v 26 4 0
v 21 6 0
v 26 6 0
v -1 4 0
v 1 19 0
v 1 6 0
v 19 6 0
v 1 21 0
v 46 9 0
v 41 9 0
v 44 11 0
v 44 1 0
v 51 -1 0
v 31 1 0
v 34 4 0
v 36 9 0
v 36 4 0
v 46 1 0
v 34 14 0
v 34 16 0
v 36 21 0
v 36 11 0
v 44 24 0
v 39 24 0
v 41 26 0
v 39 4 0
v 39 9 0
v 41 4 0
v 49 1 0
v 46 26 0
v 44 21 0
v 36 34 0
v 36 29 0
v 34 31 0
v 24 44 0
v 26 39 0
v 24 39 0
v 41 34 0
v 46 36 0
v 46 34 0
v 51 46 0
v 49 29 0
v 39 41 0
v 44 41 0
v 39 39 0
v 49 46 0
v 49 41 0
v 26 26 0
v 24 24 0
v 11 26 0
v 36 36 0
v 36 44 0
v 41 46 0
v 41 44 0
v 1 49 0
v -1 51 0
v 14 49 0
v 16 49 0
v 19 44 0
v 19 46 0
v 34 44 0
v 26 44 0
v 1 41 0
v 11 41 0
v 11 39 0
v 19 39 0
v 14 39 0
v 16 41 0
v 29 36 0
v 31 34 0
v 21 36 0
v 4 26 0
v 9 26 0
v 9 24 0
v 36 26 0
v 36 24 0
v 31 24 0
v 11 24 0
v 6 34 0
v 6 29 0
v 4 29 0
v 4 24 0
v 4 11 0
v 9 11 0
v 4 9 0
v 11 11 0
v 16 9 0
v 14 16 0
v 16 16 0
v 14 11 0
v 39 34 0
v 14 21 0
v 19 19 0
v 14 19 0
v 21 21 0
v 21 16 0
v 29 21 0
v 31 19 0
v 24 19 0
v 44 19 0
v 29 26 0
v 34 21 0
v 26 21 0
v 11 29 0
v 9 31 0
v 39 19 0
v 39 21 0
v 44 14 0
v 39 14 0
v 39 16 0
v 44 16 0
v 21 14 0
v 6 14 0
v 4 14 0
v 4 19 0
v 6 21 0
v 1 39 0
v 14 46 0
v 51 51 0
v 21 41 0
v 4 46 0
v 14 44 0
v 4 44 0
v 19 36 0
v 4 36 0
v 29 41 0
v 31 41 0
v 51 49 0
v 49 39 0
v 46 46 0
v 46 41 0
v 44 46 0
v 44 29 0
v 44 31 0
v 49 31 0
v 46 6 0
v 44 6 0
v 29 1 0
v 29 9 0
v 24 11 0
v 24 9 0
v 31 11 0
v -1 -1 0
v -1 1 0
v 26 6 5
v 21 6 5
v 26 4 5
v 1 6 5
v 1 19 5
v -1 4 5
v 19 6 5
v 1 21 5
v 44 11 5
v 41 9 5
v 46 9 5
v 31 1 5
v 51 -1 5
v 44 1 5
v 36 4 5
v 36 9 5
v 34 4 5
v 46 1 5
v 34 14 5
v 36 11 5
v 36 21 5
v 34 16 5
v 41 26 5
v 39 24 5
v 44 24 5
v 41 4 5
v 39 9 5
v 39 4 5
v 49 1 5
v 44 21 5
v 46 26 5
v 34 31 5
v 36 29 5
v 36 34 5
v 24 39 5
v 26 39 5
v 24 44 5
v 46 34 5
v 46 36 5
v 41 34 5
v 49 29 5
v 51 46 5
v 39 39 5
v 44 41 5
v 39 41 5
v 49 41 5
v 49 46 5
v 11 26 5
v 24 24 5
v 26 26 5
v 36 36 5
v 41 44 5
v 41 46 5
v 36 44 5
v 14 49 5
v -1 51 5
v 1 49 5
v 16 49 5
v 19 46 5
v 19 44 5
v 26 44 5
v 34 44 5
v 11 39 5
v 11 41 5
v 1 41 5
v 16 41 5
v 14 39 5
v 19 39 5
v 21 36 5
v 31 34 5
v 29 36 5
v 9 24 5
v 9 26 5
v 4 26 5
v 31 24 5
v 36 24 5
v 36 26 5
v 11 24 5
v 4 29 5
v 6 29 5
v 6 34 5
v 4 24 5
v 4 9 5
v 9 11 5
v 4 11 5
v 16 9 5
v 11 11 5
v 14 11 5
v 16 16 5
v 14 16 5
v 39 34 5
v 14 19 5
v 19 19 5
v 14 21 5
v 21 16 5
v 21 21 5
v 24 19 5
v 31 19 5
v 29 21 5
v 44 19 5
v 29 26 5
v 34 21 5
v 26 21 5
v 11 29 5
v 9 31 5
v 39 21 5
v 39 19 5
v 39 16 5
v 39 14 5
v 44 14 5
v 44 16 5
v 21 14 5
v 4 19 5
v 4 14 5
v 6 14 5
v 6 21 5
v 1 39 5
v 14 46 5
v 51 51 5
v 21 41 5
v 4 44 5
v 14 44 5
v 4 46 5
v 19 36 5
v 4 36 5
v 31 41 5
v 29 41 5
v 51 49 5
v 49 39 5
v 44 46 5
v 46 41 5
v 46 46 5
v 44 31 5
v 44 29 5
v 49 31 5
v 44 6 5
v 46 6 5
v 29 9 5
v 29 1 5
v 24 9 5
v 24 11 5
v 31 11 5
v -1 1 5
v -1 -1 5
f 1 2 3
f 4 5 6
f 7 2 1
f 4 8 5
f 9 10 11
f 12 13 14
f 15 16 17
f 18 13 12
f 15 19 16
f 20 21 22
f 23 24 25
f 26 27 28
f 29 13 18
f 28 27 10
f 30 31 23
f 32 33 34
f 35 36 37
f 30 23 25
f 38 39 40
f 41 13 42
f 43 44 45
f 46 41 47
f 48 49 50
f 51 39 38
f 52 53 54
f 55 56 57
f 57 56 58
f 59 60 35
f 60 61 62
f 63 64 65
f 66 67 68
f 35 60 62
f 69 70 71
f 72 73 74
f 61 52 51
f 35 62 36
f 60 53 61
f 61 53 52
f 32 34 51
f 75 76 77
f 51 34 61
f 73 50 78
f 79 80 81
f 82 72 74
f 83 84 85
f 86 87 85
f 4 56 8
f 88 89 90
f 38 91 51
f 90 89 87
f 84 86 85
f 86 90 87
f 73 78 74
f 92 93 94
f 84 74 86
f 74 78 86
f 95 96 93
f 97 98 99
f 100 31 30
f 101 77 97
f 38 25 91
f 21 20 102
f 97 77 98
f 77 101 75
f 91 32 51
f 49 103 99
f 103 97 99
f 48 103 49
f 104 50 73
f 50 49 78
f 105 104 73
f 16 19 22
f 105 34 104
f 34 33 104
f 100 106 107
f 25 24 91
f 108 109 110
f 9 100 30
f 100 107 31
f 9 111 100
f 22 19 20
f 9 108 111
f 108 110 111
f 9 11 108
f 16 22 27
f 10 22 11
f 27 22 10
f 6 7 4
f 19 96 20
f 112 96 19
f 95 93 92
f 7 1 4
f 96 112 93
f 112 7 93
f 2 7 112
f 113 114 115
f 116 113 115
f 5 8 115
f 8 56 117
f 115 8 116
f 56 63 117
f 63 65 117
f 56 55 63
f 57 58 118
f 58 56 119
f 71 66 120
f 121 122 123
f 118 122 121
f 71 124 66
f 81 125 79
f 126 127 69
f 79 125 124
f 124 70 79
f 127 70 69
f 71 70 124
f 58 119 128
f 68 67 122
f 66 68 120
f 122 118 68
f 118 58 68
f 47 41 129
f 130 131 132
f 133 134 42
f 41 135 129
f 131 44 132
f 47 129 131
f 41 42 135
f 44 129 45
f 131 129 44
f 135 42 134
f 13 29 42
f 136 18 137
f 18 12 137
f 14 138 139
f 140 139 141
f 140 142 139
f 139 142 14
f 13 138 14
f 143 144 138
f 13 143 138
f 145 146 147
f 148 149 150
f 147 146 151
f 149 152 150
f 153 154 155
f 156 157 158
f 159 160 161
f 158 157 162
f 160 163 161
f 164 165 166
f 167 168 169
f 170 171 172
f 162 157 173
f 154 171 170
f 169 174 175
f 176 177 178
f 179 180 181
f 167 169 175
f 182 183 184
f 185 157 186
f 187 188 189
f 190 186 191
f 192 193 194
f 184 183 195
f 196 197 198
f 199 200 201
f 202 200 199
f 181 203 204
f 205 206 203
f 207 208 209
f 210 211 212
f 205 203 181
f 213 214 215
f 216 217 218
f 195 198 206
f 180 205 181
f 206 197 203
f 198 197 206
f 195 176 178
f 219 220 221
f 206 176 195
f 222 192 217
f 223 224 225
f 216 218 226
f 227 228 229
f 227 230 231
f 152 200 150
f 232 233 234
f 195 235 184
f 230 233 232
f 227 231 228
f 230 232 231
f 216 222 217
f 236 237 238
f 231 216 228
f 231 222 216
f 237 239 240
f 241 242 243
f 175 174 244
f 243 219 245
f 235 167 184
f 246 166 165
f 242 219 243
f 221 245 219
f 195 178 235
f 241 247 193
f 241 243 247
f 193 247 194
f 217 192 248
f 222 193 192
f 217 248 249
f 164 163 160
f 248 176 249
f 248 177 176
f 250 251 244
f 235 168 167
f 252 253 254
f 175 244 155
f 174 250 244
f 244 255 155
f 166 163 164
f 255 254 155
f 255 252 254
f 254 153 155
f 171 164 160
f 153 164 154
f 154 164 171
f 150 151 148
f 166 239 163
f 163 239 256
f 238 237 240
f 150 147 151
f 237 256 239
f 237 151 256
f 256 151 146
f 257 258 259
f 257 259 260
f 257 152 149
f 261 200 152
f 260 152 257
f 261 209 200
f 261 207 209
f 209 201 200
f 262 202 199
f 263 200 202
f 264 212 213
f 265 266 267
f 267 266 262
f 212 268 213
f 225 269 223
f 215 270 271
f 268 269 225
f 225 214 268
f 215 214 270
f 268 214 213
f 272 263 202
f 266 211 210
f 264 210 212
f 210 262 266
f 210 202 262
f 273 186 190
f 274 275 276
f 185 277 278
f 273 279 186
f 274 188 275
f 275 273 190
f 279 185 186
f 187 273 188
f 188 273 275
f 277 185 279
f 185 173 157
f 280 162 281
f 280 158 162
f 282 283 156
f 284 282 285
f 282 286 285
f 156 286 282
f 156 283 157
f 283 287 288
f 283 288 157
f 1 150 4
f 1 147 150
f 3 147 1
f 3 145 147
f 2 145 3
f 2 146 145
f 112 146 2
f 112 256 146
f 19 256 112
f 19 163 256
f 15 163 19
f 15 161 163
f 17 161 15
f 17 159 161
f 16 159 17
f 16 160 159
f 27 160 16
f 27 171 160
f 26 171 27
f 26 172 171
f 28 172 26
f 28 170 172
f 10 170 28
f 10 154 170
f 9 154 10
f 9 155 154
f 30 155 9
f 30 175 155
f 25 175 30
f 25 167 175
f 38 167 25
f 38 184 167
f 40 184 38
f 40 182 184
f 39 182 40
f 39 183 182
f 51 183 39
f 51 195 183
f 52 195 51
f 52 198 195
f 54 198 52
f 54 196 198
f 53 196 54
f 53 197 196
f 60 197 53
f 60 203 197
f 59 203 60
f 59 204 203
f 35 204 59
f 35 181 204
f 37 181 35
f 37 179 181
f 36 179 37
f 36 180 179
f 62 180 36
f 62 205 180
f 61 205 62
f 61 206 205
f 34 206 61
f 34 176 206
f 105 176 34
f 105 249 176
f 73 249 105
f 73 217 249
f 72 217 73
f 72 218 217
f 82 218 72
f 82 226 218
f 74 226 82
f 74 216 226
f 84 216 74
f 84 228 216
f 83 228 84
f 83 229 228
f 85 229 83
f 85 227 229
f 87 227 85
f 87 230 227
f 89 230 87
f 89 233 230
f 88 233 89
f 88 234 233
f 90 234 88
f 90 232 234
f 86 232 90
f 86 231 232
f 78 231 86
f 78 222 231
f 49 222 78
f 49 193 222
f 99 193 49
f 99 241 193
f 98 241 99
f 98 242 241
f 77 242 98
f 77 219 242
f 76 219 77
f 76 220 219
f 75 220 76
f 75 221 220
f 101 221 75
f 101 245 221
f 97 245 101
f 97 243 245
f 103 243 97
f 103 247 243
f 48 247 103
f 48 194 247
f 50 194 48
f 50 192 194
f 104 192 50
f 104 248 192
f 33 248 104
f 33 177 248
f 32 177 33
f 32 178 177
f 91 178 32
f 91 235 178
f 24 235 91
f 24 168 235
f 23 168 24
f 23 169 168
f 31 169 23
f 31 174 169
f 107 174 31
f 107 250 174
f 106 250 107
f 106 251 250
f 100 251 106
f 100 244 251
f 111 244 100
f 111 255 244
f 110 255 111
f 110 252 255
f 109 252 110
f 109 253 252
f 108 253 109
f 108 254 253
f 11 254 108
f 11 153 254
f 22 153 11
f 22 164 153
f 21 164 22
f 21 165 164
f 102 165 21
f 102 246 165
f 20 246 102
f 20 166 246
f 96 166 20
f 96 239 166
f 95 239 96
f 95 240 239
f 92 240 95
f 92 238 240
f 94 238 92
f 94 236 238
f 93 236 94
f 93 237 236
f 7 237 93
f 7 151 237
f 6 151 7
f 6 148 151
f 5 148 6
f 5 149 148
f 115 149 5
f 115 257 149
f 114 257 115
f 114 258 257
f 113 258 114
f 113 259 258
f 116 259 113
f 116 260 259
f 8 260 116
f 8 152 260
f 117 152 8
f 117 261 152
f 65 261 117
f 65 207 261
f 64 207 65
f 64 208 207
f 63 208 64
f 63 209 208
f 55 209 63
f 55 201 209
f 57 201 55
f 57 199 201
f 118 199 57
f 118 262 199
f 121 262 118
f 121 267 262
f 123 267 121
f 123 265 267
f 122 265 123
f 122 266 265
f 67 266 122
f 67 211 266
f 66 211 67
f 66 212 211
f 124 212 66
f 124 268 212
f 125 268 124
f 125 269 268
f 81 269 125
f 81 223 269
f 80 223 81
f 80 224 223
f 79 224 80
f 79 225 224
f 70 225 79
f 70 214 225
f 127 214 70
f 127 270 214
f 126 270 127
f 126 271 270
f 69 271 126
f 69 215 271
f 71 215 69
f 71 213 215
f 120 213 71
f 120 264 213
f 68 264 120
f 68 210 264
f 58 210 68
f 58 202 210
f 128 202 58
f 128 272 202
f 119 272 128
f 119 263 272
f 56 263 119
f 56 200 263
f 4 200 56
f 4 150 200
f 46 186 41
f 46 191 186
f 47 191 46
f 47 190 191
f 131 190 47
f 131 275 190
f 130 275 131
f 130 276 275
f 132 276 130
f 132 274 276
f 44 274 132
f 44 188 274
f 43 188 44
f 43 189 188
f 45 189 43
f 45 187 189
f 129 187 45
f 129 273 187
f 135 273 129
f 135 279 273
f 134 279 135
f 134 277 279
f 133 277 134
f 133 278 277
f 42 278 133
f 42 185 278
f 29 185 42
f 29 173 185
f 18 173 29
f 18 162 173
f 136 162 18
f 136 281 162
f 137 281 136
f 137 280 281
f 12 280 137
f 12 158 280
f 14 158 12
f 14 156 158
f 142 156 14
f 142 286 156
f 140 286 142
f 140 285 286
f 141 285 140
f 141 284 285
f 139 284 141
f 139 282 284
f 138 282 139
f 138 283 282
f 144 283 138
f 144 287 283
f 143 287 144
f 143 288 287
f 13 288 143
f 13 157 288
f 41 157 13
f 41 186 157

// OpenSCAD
rows = 10; 
columns = 10; 
wall_thickness = 2;
wall_height = 5;
block_width = 5;


/*
 * constants, for clearness
 *
 */
 
// random directions, for picking up a direction to visit the next block
function PERMUTATION_OF_FOUR() = [
    [1, 2, 3, 4],
    [1, 2, 4, 3],
    [1, 3, 2, 4],
    [1, 3, 4, 2],
    [1, 4, 2, 3],
    [1, 4, 3, 2],
    [2, 1, 3, 4],
    [2, 1, 4, 3],
    [2, 3, 1, 4],
    [2, 3, 4, 1],
    [2, 4, 1, 3],
    [2, 4, 3, 1],
    [3, 1, 2, 4],
    [3, 1, 4, 2],
    [3, 2, 1, 4],
    [3, 2, 4, 1],
    [3, 4, 1, 2],
    [3, 4, 2, 1],
    [4, 1, 2, 3],
    [4, 1, 3, 2],
    [4, 2, 1, 3],
    [4, 2, 3, 1],
    [4, 3, 1, 2],
    [4, 3, 2, 1]
];

function NO_WALL() = 0;
function UP_WALL() = 1;
function RIGHT_WALL() = 2;
function UP_RIGHT_WALL() = 3;

function NOT_VISITED() = 0;
function VISITED() = 1;

/* 
 * modules for creating a maze
 *
 */

// give a [x, y] point and length. draw a line in the x direction
module x_line(point, length, thickness = 1) {
    offset = thickness / 2;
    translate([point[0] - offset, point[1] - offset, 0]) 
        square([length + thickness, thickness]);
}

// give a [x, y] point and length. draw a line in the y direction
module y_line(point, length, thickness = 1) {
    offset = thickness / 2;
    translate([point[0] - offset, point[1] - offset, 0])  
        square([thickness, length + thickness]);
}

// create the outer wall of maze
module maze_outer_wall(rows, columns, block_width = 5, wall_thickness = 1) {
    x_line([0, 0], columns * block_width, wall_thickness);
    x_line([0, rows * block_width], columns * block_width, wall_thickness);
    y_line([0, block_width], (rows - 1) * block_width, wall_thickness);
    y_line([columns * block_width, 0], (rows - 1) * block_width, wall_thickness);
}

// create the inner wall of maze
module maze_inner_wall(maze, block_width = 5, wall_thickness = 1) {
    for(i = [0:len(maze) - 1]) {
        cord = maze[i];
        x = (cord[0] - 1) * block_width;
        y = (cord[1] - 1) * block_width;
        v = cord[3];
        
        if(v == 1 || v == 3) {
            x_line([x, y], block_width, wall_thickness);
        }
        if(v == 2 || v == 3) {
            y_line([x + block_width, y], block_width, wall_thickness);
        }
    }  
}

// create a maze
module maze(rows, columns, maze_vector, block_width = 5, wall_thickness = 1) {
     maze_outer_wall(rows, columns, block_width, wall_thickness);
     maze_inner_wall(maze_vector, block_width, wall_thickness);
}

/* 
 * utilities functions
 *
 */

// comare the equality of [x1, y1] and [x2, y2]
function cord_equals(cord1, cord2) = cord1 == cord2;

// is the point visited?
function not_visited(cord, vs, index = 0) =
    index == len(vs) ? true : 
        (cord_equals([vs[index][0], vs[index][1]], cord) && vs[index][2] == 1 ? false :
            not_visited(cord, vs, index + 1));
            
// pick a direction randomly
function rand_dirs() =
    PERMUTATION_OF_FOUR()[round(rands(0, 24, 1)[0])]; 

// give a index (exclusivly), slice a vector 
function head_to(i, vs) =
    i >= len(vs) ? vs : (
        i == 0 ? [] : concat(head_to(i - 1, vs), [vs[i - 1]])
    );

// give a index (exclusivly), slice a vector 
function tail_from(i, vs, index = 0, new_vs = []) =
    i >= len(vs) ? [] : (
        index < i ? tail_from(i, vs, index + 1) : (
            index < len(vs) ? tail_from(i, vs, index + 1, concat(new_vs, [vs[index]])) : new_vs
        )
    );

// replace v1 in the vector with v2 
function replace(v1, v2, vs, index = 0) =
    index == len(vs) ? vs : (
        vs[index] == v1 ? concat(concat(head_to(index, vs), [v2]), tail_from(index + 1, vs)) : replace(v1, v2, vs, index + 1)
    );
    
/* 
 * functions for generating a maze vector
 *
 */

// initialize rows of a maze
function init_row(n, length) =
    length == 0 ? [] : concat(init_row(n, length - 1), [[length, n, 0, UP_RIGHT_WALL()]]);
    
// initialize a maze
function init_maze(rows, columns) =
    rows == 0 ? [] : concat(init_maze(rows - 1, columns), init_row(rows, columns));
    
// find a vector in the maze vector
function find(i, j, maze_vector, index = 0) =
    index == len(maze_vector) ? [] : (
        cord_equals([i, j], [maze_vector[index][0], maze_vector[index][1]]) ? maze_vector[index] : find(i, j, maze_vector, index + 1)
    );

////
// NO_WALL = 0;
// UP_WALL = 1;
// RIGHT_WALL = 2;
// UP_RIGHT_WALL = 3;
function delete_right_wall(original_block) = 
    original_block == NO_WALL() || original_block == RIGHT_WALL() ? NO_WALL() : UP_WALL();

function delete_up_wall(original_block) = 
    (original_block == NO_WALL() || original_block == UP_WALL()) ? NO_WALL() : RIGHT_WALL();
    
function delete_right_wall_of(vs, is_visited, maze_vector) =
    replace(vs, [vs[0], vs[1] , is_visited, delete_right_wall(vs[3])] ,maze_vector);

function delete_up_wall_of(vs, is_visited, maze_vector) =
    replace(vs, [vs[0], vs[1] , is_visited, delete_up_wall(vs[3])] ,maze_vector);

function go_right(i, j, rows, columns, maze_vector) =
    go_maze(i + 1, j, rows, columns, delete_right_wall_of(find(i, j, maze_vector), VISITED(), maze_vector));
    
function go_up(i, j, rows, columns, maze_vector) =
    go_maze(i, j - 1, rows, columns, delete_up_wall_of(find(i, j, maze_vector), VISITED(), maze_vector));
    
function visit(v, maze_vector) =
    replace(v, [v[0], v[1], VISITED(), v[3]], maze_vector);

function go_left(i, j, rows, columns, maze_vector) =
    go_maze(i - 1, j, rows, columns, delete_right_wall_of(find(i - 1, j, maze_vector), NOT_VISITED(), maze_vector));
    
function go_down(i, j, rows, columns, maze_vector) =
    go_maze(i, j + 1, rows, columns, delete_up_wall_of(find(i, j + 1, maze_vector), NOT_VISITED(), maze_vector));
    
function go_maze(i, j, rows, columns, maze_vector) =
    look_around(i, j, rand_dirs(), rows, columns, visit(find(i, j, maze_vector), maze_vector));
    
function look_around(i, j, dirs, rows, columns, maze_vector, index = 0) =
    index == 4 ? maze_vector : 
        look_around( 
            i, j, dirs, 
            rows, columns, 
            build_wall(i, j, dirs[index], rows, columns, maze_vector), 
            index + 1
        ); 

function build_wall(i, j, n, rows, columns, maze_vector) = 
    n == 1 && i != columns && not_visited([i + 1, j], maze_vector) ? go_right(i, j, rows, columns, maze_vector) : ( 
        n == 2 && j != 1 && not_visited([i, j - 1], maze_vector) ? go_up(i, j, rows, columns, maze_vector)  : (
            n == 3 && i != 1 && not_visited([i - 1, j], maze_vector) ? go_left(i, j,rows, columns,  maze_vector)  : (
                n == 4 && j != rows && not_visited([i, j + 1], maze_vector) ? go_down(i, j, rows, columns, maze_vector) : maze_vector
            ) 
        )
    ); 
 
/*
 * create a maze
 *
 */
maze_vector = go_maze(1, 1, rows, columns, replace([columns, rows, 0, UP_RIGHT_WALL()], [columns, rows, 0, UP_WALL()], init_maze(rows, columns)));
linear_extrude(wall_height) 
    maze(rows, columns, maze_vector, block_width, wall_thickness);
